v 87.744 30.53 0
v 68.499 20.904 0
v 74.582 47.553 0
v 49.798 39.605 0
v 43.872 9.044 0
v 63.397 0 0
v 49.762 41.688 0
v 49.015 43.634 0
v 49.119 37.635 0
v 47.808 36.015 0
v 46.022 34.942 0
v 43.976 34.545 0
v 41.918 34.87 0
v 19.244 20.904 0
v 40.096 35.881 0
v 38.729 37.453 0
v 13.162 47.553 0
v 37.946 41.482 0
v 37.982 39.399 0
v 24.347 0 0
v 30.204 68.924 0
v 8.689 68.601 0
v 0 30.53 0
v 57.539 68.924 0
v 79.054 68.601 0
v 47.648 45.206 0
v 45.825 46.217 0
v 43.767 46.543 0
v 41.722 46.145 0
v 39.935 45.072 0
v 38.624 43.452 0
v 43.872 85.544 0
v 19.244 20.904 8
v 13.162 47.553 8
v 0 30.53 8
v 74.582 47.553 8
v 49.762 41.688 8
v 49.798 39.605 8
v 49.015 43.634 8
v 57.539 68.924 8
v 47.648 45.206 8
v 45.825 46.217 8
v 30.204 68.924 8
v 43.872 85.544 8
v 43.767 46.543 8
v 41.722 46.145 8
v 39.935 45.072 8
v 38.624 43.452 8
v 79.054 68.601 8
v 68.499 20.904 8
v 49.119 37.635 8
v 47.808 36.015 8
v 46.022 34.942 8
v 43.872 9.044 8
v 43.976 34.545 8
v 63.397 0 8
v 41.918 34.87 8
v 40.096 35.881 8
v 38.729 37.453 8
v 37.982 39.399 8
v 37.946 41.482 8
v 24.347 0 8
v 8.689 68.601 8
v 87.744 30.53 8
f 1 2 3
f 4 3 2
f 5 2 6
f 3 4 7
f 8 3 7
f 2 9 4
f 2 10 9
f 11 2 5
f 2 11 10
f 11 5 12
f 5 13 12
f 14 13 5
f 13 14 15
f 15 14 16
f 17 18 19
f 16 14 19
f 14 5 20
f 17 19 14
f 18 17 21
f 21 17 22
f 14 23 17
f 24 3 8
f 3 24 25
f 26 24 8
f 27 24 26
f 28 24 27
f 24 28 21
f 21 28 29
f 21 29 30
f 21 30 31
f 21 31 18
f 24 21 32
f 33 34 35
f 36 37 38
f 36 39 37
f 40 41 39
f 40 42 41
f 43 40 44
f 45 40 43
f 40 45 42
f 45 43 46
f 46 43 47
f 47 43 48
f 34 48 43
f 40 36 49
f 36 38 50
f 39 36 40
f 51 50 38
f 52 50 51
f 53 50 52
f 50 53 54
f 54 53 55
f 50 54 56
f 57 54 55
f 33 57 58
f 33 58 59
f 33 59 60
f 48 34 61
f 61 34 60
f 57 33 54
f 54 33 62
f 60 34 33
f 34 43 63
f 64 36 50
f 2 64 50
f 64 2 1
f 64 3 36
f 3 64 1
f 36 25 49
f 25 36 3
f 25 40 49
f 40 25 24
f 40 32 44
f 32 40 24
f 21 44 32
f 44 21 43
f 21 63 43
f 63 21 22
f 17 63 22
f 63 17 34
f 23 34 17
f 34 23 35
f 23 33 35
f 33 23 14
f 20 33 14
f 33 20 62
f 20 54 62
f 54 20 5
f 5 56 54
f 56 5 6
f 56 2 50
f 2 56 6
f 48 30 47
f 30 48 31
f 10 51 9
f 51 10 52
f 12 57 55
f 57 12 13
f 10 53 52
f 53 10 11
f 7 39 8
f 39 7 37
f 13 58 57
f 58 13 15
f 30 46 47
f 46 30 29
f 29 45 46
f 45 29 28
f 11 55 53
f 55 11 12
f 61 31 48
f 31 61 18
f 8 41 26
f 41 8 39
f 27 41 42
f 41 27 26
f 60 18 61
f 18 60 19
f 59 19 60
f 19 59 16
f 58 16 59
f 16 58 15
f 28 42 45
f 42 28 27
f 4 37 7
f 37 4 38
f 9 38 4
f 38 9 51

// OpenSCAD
$fn = 32;

// ----------------------------------------------------------------------
// Star wheel: 7-point blunt, R45
// ----------------------------------------------------------------------

// --- parameters (mm) ---
n_points = 7;             // number of points / teeth
r_out = 45;               // tip radius
r_in = 31.5;              // root radius
bore_r = 6;               // centre bore radius
plate_t = 8;              // plate thickness, Z (extrusion height)
bore_d = 12;              // centre bore diameter

profile = [[43.872, 85.544], [30.204, 68.924], [8.689, 68.601], [13.162, 47.553], [0, 30.53], [19.244, 20.904], [24.347, 0], [43.872, 9.044], [63.397, 0], [68.499, 20.904], [87.744, 30.53], [74.582, 47.553], [79.054, 68.601], [57.539, 68.924]];  // primary outline, 14 points, counter clockwise
void_1 = [[49.762, 41.688], [49.015, 43.634], [47.648, 45.206], [45.825, 46.217], [43.767, 46.543], [41.722, 46.145], [39.935, 45.072], [38.624, 43.452], [37.946, 41.482], [37.982, 39.399], [38.729, 37.453], [40.096, 35.881], [41.918, 34.87], [43.976, 34.545], [46.022, 34.942], [47.808, 36.015], [49.119, 37.635], [49.798, 39.605]];  // centre bore, 18 points

// --- the one profile operation ---
difference() {
  linear_extrude(height = plate_t) polygon(points = profile);
  translate([0, 0, -1])
    linear_extrude(height = plate_t + 2) polygon(points = void_1);
}
